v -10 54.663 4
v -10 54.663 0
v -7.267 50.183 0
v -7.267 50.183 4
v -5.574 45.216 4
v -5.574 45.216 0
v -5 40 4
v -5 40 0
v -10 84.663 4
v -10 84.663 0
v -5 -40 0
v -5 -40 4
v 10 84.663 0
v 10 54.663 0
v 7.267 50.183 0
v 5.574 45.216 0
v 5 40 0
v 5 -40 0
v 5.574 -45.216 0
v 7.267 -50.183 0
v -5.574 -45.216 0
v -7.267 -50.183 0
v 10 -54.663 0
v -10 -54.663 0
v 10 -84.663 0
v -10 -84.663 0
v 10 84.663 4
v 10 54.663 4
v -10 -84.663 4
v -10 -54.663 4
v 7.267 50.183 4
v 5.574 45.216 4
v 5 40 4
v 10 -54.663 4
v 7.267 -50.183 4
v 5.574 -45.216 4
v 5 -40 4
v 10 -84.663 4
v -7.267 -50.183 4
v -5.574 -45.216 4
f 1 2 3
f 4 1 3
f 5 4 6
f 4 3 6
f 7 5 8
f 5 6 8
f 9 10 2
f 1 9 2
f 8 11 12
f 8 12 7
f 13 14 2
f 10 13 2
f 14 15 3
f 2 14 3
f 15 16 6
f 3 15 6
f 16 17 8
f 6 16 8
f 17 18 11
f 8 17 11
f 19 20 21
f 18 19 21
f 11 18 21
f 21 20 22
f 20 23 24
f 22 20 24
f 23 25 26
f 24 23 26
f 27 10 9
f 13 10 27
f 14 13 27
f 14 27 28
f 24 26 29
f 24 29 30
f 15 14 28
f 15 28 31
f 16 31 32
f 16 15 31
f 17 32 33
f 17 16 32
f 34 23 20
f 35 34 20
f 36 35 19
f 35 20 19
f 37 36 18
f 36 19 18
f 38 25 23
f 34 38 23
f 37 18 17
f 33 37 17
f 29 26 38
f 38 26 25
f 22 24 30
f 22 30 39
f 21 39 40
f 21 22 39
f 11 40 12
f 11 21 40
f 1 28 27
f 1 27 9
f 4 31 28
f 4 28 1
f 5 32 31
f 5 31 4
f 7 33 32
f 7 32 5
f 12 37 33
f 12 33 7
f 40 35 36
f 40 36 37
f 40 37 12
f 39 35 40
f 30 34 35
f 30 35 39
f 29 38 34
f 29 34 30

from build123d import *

# Parameters (mm, degrees)
F1_DEPTH = 4


with BuildPart() as f1:
    # F0 (on Top) → F1 (new body)
    with BuildSketch(Plane.XY):
        with BuildLine():
            Line((-5, 40), (-5, 0))
            Line((-5, 0), (0, 0))
            Line((0, 0), (0, 84.662878))
            Line((0, 84.662878), (-10, 84.662878))
            Line((-10, 84.662878), (-10, 54.662878))
            ThreePointArc((-10, 54.662878), (-6.284367, 47.745967), (-5, 40))
        make_face()
    extrude(amount=F1_DEPTH)

    # F2: F1 across face


with BuildPart() as f1_1:
    add(f1.part)
    add(f1.part.mirror(Plane(origin=(0, 42.331439, 2), x_dir=(0, 1, 0), z_dir=(1, 0, 0))))

    # F3: F1 across face


with BuildPart() as f1_2:
    add(f1_1.part)
    add(f1_1.part.mirror(Plane(origin=(0, 0, 2), x_dir=(1, 0, 0), z_dir=(0, -1, 0))))


solid = f1_2.part
